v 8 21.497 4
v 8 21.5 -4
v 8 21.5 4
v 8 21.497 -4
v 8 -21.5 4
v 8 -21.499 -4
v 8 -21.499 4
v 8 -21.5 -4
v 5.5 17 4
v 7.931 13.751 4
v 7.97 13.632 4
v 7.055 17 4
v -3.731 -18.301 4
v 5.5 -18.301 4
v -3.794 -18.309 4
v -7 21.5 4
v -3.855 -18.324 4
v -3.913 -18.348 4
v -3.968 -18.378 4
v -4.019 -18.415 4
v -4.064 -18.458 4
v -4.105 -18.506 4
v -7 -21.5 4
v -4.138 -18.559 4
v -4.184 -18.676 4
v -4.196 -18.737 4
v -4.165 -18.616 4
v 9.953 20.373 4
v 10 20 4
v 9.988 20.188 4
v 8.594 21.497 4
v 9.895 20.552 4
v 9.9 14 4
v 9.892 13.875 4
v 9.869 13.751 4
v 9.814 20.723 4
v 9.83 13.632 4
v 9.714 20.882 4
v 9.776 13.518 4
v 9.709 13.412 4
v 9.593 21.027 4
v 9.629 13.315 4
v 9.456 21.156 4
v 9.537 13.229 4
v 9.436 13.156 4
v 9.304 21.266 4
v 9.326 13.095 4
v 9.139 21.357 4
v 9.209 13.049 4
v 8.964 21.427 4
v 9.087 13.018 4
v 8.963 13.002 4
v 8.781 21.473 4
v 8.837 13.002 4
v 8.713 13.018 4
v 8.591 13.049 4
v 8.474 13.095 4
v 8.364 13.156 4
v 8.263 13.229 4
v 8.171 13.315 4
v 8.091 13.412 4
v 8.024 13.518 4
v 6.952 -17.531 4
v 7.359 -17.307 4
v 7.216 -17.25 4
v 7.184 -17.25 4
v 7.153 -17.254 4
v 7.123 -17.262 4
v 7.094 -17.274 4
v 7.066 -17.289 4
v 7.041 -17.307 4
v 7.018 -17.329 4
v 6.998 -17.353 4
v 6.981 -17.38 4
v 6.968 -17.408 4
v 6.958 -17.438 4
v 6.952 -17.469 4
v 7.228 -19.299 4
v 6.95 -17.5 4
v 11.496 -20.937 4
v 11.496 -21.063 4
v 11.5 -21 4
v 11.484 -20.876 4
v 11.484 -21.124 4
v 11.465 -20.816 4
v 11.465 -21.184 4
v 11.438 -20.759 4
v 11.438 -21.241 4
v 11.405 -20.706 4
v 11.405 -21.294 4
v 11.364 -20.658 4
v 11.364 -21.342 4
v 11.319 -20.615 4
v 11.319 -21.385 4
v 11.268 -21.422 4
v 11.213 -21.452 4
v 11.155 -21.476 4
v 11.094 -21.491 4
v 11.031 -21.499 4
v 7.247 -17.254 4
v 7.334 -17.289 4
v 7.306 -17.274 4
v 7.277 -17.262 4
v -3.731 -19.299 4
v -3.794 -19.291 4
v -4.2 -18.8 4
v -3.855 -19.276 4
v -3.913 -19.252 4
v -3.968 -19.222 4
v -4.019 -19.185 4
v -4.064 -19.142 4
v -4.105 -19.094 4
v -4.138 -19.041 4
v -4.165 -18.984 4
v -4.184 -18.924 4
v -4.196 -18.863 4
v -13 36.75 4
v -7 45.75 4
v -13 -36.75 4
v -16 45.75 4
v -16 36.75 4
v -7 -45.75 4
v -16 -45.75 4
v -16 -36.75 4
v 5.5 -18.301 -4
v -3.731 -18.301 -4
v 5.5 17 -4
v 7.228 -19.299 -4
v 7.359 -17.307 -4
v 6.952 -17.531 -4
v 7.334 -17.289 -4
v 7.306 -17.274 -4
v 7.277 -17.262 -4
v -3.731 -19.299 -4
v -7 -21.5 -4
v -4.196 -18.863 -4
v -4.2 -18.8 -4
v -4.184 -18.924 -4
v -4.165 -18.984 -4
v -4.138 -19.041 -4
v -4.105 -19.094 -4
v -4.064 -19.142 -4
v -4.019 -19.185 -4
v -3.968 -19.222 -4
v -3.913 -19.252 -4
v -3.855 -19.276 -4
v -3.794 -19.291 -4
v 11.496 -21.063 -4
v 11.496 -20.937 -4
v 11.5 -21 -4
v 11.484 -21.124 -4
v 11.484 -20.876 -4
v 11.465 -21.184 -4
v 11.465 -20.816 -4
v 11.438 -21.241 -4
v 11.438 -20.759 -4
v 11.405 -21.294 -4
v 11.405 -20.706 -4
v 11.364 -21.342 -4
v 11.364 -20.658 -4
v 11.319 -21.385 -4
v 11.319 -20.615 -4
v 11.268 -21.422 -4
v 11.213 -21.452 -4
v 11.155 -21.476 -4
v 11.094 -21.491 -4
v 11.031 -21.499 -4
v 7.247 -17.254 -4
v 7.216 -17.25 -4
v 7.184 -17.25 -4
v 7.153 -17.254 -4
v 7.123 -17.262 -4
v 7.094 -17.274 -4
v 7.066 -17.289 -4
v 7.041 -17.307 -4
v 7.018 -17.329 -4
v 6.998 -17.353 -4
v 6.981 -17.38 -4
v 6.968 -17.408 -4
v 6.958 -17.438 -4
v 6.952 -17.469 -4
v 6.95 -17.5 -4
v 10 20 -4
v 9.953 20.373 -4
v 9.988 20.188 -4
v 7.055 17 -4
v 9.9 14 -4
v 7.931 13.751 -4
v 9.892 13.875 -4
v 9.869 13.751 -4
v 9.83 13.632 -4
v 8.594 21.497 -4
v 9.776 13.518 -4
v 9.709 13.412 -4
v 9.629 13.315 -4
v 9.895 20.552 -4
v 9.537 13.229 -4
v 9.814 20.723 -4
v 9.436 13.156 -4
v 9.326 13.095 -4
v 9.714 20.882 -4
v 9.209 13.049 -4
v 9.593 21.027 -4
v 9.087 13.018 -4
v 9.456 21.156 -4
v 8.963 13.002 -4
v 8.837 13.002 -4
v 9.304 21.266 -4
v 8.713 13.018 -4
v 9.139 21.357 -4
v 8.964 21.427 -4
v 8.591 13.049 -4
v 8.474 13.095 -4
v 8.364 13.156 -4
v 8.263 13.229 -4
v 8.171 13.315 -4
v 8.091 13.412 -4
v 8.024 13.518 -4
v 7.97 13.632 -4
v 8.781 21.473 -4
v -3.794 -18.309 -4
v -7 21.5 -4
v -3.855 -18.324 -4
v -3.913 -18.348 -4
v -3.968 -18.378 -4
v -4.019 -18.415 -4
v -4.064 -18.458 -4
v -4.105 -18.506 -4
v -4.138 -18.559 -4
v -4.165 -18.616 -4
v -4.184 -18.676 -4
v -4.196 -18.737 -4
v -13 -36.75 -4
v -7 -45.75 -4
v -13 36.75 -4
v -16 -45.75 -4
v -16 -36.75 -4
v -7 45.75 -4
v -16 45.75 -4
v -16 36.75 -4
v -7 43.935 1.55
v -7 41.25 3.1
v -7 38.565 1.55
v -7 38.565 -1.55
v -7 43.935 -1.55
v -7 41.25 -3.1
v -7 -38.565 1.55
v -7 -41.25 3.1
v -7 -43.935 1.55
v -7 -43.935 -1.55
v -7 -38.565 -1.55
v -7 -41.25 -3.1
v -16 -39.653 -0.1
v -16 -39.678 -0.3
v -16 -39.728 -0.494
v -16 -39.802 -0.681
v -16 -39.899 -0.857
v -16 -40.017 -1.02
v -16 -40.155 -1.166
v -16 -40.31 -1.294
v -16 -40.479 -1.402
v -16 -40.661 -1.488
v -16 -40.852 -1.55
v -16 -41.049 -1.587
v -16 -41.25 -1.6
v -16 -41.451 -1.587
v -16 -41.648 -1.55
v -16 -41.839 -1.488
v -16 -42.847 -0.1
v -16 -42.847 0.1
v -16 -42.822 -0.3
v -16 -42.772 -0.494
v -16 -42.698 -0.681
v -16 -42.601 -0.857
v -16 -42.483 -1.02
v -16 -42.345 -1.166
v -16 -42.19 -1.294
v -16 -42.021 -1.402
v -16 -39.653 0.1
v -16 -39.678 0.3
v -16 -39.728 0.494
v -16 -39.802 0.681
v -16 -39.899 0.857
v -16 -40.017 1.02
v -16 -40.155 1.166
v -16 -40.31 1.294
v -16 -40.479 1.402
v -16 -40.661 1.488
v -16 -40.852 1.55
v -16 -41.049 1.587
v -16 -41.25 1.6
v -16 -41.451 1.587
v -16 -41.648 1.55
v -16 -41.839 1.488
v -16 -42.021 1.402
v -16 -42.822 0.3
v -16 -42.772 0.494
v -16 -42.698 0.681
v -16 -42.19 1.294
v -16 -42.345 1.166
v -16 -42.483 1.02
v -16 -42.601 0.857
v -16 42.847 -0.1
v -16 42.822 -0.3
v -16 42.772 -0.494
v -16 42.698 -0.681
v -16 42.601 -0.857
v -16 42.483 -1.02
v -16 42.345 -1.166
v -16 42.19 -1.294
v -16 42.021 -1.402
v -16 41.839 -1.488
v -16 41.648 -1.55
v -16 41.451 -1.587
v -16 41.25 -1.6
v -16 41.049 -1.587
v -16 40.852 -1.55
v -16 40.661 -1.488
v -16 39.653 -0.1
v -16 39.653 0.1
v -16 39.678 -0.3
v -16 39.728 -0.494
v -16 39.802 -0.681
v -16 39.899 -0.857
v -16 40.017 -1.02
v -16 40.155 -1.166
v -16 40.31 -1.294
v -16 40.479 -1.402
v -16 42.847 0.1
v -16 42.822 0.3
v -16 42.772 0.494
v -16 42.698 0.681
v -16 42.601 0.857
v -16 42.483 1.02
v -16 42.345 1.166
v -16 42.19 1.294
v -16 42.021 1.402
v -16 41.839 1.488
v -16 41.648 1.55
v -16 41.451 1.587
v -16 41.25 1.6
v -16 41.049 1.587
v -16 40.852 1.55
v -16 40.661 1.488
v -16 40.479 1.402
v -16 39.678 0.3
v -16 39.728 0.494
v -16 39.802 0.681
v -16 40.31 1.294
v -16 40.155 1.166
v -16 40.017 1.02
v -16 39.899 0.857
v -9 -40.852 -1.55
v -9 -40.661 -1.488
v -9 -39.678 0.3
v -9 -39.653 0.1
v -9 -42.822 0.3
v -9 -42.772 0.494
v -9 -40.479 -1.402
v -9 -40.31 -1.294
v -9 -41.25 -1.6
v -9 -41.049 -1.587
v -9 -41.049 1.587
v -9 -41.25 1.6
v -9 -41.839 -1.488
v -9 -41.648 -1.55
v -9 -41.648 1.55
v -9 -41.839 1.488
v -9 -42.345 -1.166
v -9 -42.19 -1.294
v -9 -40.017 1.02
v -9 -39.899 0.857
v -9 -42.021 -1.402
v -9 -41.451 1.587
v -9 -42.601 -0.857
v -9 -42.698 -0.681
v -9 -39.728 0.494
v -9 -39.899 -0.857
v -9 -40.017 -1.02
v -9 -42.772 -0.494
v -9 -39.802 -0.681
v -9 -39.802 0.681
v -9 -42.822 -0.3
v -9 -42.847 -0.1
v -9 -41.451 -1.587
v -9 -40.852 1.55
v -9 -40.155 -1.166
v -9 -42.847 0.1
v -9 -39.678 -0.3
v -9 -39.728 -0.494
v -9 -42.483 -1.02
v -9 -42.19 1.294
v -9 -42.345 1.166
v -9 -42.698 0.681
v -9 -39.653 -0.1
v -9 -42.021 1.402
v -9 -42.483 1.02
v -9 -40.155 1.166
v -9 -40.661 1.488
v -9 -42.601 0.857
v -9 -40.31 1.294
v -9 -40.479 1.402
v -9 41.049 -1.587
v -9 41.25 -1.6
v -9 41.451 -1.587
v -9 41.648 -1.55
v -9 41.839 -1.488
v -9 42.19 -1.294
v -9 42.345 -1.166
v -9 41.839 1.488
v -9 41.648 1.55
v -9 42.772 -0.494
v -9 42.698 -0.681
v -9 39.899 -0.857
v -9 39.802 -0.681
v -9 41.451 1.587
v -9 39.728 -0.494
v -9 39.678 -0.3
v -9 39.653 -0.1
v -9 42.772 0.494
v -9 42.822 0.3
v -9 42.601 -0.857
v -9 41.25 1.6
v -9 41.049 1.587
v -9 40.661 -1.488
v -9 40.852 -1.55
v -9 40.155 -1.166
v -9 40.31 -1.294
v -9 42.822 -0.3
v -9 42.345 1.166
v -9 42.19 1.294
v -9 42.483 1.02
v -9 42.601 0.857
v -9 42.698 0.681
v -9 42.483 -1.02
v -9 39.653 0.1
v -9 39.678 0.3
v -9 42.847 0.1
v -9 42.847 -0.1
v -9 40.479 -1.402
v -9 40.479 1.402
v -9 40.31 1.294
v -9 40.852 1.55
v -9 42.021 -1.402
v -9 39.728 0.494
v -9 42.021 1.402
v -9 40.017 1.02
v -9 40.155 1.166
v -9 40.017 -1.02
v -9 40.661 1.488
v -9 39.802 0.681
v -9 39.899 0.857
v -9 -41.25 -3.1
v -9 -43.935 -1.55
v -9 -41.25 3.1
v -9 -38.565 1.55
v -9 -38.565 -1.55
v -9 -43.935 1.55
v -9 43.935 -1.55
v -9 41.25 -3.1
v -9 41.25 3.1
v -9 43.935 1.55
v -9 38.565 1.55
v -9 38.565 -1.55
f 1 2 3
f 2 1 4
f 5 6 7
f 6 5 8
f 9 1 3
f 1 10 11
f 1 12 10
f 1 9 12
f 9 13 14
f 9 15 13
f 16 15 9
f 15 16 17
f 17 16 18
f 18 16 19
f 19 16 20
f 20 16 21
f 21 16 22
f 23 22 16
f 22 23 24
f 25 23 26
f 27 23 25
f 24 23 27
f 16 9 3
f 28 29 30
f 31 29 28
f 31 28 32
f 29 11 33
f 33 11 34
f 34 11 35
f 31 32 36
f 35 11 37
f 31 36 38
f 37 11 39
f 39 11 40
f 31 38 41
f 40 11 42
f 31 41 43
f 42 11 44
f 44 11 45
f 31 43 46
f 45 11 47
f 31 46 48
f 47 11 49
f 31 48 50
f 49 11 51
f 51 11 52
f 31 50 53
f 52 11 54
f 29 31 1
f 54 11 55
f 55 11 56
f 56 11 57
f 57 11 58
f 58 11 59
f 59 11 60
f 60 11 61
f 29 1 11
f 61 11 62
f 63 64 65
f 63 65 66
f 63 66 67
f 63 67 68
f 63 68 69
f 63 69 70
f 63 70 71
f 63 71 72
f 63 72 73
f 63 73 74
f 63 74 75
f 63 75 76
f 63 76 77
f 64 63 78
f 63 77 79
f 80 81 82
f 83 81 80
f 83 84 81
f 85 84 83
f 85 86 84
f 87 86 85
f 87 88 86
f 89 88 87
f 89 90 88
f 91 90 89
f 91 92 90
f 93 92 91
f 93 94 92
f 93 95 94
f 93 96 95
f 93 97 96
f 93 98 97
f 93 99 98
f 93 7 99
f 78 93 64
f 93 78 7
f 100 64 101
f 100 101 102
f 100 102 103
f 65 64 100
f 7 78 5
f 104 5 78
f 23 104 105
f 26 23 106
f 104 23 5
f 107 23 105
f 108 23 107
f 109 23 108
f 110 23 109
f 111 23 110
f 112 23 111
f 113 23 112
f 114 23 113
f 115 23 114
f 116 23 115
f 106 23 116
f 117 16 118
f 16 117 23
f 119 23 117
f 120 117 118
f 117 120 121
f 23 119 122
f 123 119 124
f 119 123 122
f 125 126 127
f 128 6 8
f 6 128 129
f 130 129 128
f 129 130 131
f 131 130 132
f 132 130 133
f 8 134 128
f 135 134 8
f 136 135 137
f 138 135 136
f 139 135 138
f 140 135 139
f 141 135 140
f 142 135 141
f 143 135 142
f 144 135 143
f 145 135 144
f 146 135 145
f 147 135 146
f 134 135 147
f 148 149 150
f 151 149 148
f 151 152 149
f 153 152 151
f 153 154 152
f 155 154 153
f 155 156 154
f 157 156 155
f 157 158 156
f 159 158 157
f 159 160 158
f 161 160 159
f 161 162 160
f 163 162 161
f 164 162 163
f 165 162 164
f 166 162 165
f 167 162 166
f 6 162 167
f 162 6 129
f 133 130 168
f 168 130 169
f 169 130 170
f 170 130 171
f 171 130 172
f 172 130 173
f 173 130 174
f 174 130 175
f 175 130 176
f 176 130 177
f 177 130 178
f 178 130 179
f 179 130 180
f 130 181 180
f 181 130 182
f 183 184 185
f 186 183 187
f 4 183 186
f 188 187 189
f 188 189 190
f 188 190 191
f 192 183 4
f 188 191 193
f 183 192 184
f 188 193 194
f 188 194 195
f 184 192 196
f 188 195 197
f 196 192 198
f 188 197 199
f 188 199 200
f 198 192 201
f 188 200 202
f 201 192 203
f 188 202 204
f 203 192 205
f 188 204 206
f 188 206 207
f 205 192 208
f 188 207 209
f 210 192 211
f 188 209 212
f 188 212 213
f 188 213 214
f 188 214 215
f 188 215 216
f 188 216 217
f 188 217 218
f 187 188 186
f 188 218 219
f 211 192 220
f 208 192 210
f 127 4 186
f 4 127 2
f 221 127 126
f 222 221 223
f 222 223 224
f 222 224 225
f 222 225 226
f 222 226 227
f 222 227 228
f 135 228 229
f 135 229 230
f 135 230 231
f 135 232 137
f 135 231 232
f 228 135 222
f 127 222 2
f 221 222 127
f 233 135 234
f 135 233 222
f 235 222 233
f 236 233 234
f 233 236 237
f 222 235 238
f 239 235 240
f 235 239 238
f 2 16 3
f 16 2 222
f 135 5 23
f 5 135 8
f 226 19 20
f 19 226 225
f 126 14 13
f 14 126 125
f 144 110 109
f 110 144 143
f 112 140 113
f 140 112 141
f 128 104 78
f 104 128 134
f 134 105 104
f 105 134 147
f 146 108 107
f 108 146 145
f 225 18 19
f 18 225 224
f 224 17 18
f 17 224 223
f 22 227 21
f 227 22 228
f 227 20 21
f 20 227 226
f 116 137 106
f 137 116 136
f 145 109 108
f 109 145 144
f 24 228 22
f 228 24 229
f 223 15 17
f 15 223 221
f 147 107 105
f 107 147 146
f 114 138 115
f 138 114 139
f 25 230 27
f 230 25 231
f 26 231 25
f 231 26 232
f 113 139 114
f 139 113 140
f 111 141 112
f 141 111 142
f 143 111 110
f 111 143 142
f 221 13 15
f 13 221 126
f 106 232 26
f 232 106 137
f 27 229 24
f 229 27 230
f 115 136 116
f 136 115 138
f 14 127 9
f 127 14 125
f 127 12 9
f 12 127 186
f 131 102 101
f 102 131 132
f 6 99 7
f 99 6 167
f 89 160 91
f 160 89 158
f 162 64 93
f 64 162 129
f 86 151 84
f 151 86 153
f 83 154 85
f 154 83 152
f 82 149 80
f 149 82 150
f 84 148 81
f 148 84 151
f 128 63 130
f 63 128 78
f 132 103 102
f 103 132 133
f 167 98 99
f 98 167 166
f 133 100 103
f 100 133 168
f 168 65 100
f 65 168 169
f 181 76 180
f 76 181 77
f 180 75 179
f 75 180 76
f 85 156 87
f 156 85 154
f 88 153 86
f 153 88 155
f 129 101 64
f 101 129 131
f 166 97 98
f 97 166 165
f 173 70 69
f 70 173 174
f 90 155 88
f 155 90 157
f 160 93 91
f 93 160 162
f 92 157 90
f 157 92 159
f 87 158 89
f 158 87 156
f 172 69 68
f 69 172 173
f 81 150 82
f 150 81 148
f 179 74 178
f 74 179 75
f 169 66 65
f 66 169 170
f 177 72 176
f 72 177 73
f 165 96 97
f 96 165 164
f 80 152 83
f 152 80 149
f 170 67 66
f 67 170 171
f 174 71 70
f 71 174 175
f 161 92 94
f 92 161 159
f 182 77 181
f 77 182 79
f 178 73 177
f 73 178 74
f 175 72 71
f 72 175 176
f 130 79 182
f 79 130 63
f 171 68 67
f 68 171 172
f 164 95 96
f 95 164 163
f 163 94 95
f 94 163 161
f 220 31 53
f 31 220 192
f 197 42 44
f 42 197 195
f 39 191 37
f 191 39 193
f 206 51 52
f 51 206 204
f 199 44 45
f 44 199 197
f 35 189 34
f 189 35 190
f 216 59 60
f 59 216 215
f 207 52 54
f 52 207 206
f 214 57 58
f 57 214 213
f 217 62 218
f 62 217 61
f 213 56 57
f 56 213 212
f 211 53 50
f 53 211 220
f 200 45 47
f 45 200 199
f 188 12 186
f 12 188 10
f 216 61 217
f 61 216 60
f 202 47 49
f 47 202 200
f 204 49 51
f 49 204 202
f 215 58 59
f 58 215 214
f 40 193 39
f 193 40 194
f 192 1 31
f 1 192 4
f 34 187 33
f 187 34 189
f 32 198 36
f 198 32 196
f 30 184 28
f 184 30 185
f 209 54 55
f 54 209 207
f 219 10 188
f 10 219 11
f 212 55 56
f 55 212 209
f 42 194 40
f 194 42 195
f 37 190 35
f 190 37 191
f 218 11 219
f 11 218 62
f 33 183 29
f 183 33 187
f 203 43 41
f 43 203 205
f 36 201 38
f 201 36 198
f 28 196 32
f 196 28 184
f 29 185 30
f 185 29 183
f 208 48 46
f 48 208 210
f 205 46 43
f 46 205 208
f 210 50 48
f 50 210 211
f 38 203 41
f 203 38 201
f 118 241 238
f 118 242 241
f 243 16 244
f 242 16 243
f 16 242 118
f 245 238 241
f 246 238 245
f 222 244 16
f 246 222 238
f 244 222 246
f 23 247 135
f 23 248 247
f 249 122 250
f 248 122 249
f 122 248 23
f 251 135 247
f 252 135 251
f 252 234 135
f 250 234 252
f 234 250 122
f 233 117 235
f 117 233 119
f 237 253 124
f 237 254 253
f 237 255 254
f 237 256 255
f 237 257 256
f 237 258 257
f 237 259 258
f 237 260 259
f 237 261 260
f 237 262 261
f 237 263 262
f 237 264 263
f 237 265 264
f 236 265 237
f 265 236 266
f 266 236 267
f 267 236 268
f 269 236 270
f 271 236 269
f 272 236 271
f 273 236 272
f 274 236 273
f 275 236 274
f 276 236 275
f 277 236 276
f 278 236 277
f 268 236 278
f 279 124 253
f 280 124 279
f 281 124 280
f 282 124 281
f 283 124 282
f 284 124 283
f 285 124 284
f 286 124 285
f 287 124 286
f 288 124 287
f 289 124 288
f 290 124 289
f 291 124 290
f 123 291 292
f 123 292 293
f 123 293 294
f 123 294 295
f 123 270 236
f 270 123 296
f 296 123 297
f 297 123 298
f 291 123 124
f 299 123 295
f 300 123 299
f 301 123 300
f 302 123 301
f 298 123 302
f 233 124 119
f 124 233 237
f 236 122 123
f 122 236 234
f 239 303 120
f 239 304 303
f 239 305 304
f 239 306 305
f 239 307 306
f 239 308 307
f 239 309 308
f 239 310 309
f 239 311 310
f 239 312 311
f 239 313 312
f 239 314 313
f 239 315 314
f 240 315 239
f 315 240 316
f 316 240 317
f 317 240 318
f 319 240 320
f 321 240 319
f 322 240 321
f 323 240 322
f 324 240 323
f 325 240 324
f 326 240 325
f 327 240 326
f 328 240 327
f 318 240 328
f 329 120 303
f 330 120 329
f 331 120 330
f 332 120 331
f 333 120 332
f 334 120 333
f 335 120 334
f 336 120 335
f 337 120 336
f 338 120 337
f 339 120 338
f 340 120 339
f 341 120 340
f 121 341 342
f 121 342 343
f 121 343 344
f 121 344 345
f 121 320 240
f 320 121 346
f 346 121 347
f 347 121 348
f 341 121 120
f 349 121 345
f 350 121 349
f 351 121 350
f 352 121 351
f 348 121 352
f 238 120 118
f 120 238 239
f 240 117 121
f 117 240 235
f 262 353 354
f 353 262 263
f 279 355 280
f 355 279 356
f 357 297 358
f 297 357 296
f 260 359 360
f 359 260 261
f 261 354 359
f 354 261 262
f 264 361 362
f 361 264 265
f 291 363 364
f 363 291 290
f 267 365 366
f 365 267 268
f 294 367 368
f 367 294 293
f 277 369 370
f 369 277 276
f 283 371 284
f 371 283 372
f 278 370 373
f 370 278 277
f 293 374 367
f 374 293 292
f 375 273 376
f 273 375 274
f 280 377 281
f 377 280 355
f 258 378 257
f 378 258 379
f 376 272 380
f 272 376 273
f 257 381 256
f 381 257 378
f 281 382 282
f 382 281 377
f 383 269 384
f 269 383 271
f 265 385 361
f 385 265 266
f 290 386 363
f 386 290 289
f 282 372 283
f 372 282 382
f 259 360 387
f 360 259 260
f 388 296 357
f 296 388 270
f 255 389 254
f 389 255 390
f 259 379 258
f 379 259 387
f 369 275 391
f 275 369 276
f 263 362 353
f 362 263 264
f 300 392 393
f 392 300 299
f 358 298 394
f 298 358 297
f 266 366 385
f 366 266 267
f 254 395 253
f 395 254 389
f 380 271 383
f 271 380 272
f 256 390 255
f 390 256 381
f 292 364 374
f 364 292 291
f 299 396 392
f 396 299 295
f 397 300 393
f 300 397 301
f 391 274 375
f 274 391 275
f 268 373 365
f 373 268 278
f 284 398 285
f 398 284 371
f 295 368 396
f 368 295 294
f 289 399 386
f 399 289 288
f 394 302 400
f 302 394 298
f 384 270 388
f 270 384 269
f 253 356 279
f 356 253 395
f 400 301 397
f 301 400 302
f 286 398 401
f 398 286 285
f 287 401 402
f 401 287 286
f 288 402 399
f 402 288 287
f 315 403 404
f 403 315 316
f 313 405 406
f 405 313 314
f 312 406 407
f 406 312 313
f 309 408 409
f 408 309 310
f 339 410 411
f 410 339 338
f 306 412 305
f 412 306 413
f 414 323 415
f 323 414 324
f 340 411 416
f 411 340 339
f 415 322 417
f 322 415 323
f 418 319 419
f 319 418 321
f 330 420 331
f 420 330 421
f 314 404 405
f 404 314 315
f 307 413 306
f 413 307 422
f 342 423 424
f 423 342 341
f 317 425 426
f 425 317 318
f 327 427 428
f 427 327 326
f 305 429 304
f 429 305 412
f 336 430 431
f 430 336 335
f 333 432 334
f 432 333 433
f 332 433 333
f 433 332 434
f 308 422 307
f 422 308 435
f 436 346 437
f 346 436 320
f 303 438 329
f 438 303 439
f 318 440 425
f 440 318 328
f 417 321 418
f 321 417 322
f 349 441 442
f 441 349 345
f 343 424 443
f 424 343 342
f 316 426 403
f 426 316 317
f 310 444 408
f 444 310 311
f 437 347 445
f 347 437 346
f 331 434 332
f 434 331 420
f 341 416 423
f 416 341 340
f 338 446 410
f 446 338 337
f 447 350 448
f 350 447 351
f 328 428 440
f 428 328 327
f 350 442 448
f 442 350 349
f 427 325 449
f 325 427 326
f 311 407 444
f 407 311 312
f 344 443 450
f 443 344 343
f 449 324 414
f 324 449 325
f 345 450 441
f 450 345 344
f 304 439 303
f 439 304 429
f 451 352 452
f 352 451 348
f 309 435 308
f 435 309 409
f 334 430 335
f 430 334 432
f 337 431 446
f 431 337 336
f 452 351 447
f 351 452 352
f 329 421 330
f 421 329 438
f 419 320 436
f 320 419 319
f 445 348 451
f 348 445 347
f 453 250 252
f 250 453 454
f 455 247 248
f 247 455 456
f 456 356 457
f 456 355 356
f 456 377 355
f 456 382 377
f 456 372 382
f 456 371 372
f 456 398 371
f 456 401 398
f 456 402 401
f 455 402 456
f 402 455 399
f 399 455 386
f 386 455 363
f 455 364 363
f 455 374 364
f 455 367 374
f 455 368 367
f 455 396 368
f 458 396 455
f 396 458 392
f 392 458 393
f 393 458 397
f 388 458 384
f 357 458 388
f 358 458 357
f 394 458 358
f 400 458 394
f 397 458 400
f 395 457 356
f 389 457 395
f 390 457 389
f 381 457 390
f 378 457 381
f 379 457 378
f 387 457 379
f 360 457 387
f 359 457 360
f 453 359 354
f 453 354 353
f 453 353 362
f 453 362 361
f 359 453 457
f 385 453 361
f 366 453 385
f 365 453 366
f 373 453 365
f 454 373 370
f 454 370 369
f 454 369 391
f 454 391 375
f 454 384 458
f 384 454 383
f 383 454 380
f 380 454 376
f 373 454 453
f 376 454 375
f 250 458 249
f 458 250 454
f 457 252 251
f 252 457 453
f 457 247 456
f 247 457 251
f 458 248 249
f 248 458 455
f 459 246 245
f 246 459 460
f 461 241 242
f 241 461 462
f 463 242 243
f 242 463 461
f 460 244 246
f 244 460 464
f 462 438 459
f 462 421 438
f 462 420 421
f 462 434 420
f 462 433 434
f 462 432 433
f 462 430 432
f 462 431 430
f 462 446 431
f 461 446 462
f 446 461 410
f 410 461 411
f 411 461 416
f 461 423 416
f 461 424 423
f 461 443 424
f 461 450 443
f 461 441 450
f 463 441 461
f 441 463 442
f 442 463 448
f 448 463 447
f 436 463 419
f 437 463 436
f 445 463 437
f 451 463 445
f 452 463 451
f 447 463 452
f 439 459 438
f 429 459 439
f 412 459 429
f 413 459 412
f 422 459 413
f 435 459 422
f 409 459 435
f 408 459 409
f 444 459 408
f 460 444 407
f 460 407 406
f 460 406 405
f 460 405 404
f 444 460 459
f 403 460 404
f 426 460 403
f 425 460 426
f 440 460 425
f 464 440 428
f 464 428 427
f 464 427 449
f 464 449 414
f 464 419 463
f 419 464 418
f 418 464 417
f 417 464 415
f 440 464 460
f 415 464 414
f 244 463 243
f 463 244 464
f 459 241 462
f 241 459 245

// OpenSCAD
$fn=50;

// Clip thickness
DIN_CLIP_W = 8;

module din_clip() {
    union() {
        difference() {
            cube([16,43,DIN_CLIP_W], center=true);
            hull() {
                translate([9,-18.8,0]) cylinder(d=1,h=DIN_CLIP_W+0.1,center=true);
                translate([-3.7,-18.8,0]) cylinder(d=1,h=DIN_CLIP_W+0.1,center=true);
            }
            translate([7,-1,0]) cube([3,36,DIN_CLIP_W+0.1],center=true);
        }
        hull() {
            translate([11,-21,0]) cylinder(d=1,h=DIN_CLIP_W,center=true);
            translate([8,-21,0]) cylinder(d=1,h=DIN_CLIP_W,center=true);
            translate([7.2,-17.5,0]) cylinder(d=0.5,h=DIN_CLIP_W,center=true);
        }
        hull() {
            translate([8.5,20,0]) cylinder(d=3,h=DIN_CLIP_W,center=true);
            translate([7.8,20,0]) cylinder(d=3,h=DIN_CLIP_W,center=true);
            translate([8.9,14,0]) cylinder(d=2,h=DIN_CLIP_W,center=true);
        }
    }
}

module din_relay_board() {
    difference() {
        union() {
            din_clip();
            translate([-10,0,0]) cube([6,90,DIN_CLIP_W], center=true);
            translate([-11.5,-82.5/2,0]) cube([9,9,DIN_CLIP_W], center=true);
            translate([-11.5,+82.5/2,0]) cube([9,9,DIN_CLIP_W], center=true);
        }
        
        translate([-10,-82.5/2,0]) rotate([0,90,0]) cylinder(d=3.2,h=15,center=true);
        translate([-10,+82.5/2,0]) rotate([0,90,0]) cylinder(d=3.2,h=15,center=true);
        
        translate([-4,-82.5/2,0]) rotate([0,90,0]) cylinder(d=6.2,h=10,center=true, $fn=6);
        translate([-4,+82.5/2,0]) rotate([0,90,0]) cylinder(d=6.2,h=10,center=true, $fn=6);
    }
}

din_relay_board();
